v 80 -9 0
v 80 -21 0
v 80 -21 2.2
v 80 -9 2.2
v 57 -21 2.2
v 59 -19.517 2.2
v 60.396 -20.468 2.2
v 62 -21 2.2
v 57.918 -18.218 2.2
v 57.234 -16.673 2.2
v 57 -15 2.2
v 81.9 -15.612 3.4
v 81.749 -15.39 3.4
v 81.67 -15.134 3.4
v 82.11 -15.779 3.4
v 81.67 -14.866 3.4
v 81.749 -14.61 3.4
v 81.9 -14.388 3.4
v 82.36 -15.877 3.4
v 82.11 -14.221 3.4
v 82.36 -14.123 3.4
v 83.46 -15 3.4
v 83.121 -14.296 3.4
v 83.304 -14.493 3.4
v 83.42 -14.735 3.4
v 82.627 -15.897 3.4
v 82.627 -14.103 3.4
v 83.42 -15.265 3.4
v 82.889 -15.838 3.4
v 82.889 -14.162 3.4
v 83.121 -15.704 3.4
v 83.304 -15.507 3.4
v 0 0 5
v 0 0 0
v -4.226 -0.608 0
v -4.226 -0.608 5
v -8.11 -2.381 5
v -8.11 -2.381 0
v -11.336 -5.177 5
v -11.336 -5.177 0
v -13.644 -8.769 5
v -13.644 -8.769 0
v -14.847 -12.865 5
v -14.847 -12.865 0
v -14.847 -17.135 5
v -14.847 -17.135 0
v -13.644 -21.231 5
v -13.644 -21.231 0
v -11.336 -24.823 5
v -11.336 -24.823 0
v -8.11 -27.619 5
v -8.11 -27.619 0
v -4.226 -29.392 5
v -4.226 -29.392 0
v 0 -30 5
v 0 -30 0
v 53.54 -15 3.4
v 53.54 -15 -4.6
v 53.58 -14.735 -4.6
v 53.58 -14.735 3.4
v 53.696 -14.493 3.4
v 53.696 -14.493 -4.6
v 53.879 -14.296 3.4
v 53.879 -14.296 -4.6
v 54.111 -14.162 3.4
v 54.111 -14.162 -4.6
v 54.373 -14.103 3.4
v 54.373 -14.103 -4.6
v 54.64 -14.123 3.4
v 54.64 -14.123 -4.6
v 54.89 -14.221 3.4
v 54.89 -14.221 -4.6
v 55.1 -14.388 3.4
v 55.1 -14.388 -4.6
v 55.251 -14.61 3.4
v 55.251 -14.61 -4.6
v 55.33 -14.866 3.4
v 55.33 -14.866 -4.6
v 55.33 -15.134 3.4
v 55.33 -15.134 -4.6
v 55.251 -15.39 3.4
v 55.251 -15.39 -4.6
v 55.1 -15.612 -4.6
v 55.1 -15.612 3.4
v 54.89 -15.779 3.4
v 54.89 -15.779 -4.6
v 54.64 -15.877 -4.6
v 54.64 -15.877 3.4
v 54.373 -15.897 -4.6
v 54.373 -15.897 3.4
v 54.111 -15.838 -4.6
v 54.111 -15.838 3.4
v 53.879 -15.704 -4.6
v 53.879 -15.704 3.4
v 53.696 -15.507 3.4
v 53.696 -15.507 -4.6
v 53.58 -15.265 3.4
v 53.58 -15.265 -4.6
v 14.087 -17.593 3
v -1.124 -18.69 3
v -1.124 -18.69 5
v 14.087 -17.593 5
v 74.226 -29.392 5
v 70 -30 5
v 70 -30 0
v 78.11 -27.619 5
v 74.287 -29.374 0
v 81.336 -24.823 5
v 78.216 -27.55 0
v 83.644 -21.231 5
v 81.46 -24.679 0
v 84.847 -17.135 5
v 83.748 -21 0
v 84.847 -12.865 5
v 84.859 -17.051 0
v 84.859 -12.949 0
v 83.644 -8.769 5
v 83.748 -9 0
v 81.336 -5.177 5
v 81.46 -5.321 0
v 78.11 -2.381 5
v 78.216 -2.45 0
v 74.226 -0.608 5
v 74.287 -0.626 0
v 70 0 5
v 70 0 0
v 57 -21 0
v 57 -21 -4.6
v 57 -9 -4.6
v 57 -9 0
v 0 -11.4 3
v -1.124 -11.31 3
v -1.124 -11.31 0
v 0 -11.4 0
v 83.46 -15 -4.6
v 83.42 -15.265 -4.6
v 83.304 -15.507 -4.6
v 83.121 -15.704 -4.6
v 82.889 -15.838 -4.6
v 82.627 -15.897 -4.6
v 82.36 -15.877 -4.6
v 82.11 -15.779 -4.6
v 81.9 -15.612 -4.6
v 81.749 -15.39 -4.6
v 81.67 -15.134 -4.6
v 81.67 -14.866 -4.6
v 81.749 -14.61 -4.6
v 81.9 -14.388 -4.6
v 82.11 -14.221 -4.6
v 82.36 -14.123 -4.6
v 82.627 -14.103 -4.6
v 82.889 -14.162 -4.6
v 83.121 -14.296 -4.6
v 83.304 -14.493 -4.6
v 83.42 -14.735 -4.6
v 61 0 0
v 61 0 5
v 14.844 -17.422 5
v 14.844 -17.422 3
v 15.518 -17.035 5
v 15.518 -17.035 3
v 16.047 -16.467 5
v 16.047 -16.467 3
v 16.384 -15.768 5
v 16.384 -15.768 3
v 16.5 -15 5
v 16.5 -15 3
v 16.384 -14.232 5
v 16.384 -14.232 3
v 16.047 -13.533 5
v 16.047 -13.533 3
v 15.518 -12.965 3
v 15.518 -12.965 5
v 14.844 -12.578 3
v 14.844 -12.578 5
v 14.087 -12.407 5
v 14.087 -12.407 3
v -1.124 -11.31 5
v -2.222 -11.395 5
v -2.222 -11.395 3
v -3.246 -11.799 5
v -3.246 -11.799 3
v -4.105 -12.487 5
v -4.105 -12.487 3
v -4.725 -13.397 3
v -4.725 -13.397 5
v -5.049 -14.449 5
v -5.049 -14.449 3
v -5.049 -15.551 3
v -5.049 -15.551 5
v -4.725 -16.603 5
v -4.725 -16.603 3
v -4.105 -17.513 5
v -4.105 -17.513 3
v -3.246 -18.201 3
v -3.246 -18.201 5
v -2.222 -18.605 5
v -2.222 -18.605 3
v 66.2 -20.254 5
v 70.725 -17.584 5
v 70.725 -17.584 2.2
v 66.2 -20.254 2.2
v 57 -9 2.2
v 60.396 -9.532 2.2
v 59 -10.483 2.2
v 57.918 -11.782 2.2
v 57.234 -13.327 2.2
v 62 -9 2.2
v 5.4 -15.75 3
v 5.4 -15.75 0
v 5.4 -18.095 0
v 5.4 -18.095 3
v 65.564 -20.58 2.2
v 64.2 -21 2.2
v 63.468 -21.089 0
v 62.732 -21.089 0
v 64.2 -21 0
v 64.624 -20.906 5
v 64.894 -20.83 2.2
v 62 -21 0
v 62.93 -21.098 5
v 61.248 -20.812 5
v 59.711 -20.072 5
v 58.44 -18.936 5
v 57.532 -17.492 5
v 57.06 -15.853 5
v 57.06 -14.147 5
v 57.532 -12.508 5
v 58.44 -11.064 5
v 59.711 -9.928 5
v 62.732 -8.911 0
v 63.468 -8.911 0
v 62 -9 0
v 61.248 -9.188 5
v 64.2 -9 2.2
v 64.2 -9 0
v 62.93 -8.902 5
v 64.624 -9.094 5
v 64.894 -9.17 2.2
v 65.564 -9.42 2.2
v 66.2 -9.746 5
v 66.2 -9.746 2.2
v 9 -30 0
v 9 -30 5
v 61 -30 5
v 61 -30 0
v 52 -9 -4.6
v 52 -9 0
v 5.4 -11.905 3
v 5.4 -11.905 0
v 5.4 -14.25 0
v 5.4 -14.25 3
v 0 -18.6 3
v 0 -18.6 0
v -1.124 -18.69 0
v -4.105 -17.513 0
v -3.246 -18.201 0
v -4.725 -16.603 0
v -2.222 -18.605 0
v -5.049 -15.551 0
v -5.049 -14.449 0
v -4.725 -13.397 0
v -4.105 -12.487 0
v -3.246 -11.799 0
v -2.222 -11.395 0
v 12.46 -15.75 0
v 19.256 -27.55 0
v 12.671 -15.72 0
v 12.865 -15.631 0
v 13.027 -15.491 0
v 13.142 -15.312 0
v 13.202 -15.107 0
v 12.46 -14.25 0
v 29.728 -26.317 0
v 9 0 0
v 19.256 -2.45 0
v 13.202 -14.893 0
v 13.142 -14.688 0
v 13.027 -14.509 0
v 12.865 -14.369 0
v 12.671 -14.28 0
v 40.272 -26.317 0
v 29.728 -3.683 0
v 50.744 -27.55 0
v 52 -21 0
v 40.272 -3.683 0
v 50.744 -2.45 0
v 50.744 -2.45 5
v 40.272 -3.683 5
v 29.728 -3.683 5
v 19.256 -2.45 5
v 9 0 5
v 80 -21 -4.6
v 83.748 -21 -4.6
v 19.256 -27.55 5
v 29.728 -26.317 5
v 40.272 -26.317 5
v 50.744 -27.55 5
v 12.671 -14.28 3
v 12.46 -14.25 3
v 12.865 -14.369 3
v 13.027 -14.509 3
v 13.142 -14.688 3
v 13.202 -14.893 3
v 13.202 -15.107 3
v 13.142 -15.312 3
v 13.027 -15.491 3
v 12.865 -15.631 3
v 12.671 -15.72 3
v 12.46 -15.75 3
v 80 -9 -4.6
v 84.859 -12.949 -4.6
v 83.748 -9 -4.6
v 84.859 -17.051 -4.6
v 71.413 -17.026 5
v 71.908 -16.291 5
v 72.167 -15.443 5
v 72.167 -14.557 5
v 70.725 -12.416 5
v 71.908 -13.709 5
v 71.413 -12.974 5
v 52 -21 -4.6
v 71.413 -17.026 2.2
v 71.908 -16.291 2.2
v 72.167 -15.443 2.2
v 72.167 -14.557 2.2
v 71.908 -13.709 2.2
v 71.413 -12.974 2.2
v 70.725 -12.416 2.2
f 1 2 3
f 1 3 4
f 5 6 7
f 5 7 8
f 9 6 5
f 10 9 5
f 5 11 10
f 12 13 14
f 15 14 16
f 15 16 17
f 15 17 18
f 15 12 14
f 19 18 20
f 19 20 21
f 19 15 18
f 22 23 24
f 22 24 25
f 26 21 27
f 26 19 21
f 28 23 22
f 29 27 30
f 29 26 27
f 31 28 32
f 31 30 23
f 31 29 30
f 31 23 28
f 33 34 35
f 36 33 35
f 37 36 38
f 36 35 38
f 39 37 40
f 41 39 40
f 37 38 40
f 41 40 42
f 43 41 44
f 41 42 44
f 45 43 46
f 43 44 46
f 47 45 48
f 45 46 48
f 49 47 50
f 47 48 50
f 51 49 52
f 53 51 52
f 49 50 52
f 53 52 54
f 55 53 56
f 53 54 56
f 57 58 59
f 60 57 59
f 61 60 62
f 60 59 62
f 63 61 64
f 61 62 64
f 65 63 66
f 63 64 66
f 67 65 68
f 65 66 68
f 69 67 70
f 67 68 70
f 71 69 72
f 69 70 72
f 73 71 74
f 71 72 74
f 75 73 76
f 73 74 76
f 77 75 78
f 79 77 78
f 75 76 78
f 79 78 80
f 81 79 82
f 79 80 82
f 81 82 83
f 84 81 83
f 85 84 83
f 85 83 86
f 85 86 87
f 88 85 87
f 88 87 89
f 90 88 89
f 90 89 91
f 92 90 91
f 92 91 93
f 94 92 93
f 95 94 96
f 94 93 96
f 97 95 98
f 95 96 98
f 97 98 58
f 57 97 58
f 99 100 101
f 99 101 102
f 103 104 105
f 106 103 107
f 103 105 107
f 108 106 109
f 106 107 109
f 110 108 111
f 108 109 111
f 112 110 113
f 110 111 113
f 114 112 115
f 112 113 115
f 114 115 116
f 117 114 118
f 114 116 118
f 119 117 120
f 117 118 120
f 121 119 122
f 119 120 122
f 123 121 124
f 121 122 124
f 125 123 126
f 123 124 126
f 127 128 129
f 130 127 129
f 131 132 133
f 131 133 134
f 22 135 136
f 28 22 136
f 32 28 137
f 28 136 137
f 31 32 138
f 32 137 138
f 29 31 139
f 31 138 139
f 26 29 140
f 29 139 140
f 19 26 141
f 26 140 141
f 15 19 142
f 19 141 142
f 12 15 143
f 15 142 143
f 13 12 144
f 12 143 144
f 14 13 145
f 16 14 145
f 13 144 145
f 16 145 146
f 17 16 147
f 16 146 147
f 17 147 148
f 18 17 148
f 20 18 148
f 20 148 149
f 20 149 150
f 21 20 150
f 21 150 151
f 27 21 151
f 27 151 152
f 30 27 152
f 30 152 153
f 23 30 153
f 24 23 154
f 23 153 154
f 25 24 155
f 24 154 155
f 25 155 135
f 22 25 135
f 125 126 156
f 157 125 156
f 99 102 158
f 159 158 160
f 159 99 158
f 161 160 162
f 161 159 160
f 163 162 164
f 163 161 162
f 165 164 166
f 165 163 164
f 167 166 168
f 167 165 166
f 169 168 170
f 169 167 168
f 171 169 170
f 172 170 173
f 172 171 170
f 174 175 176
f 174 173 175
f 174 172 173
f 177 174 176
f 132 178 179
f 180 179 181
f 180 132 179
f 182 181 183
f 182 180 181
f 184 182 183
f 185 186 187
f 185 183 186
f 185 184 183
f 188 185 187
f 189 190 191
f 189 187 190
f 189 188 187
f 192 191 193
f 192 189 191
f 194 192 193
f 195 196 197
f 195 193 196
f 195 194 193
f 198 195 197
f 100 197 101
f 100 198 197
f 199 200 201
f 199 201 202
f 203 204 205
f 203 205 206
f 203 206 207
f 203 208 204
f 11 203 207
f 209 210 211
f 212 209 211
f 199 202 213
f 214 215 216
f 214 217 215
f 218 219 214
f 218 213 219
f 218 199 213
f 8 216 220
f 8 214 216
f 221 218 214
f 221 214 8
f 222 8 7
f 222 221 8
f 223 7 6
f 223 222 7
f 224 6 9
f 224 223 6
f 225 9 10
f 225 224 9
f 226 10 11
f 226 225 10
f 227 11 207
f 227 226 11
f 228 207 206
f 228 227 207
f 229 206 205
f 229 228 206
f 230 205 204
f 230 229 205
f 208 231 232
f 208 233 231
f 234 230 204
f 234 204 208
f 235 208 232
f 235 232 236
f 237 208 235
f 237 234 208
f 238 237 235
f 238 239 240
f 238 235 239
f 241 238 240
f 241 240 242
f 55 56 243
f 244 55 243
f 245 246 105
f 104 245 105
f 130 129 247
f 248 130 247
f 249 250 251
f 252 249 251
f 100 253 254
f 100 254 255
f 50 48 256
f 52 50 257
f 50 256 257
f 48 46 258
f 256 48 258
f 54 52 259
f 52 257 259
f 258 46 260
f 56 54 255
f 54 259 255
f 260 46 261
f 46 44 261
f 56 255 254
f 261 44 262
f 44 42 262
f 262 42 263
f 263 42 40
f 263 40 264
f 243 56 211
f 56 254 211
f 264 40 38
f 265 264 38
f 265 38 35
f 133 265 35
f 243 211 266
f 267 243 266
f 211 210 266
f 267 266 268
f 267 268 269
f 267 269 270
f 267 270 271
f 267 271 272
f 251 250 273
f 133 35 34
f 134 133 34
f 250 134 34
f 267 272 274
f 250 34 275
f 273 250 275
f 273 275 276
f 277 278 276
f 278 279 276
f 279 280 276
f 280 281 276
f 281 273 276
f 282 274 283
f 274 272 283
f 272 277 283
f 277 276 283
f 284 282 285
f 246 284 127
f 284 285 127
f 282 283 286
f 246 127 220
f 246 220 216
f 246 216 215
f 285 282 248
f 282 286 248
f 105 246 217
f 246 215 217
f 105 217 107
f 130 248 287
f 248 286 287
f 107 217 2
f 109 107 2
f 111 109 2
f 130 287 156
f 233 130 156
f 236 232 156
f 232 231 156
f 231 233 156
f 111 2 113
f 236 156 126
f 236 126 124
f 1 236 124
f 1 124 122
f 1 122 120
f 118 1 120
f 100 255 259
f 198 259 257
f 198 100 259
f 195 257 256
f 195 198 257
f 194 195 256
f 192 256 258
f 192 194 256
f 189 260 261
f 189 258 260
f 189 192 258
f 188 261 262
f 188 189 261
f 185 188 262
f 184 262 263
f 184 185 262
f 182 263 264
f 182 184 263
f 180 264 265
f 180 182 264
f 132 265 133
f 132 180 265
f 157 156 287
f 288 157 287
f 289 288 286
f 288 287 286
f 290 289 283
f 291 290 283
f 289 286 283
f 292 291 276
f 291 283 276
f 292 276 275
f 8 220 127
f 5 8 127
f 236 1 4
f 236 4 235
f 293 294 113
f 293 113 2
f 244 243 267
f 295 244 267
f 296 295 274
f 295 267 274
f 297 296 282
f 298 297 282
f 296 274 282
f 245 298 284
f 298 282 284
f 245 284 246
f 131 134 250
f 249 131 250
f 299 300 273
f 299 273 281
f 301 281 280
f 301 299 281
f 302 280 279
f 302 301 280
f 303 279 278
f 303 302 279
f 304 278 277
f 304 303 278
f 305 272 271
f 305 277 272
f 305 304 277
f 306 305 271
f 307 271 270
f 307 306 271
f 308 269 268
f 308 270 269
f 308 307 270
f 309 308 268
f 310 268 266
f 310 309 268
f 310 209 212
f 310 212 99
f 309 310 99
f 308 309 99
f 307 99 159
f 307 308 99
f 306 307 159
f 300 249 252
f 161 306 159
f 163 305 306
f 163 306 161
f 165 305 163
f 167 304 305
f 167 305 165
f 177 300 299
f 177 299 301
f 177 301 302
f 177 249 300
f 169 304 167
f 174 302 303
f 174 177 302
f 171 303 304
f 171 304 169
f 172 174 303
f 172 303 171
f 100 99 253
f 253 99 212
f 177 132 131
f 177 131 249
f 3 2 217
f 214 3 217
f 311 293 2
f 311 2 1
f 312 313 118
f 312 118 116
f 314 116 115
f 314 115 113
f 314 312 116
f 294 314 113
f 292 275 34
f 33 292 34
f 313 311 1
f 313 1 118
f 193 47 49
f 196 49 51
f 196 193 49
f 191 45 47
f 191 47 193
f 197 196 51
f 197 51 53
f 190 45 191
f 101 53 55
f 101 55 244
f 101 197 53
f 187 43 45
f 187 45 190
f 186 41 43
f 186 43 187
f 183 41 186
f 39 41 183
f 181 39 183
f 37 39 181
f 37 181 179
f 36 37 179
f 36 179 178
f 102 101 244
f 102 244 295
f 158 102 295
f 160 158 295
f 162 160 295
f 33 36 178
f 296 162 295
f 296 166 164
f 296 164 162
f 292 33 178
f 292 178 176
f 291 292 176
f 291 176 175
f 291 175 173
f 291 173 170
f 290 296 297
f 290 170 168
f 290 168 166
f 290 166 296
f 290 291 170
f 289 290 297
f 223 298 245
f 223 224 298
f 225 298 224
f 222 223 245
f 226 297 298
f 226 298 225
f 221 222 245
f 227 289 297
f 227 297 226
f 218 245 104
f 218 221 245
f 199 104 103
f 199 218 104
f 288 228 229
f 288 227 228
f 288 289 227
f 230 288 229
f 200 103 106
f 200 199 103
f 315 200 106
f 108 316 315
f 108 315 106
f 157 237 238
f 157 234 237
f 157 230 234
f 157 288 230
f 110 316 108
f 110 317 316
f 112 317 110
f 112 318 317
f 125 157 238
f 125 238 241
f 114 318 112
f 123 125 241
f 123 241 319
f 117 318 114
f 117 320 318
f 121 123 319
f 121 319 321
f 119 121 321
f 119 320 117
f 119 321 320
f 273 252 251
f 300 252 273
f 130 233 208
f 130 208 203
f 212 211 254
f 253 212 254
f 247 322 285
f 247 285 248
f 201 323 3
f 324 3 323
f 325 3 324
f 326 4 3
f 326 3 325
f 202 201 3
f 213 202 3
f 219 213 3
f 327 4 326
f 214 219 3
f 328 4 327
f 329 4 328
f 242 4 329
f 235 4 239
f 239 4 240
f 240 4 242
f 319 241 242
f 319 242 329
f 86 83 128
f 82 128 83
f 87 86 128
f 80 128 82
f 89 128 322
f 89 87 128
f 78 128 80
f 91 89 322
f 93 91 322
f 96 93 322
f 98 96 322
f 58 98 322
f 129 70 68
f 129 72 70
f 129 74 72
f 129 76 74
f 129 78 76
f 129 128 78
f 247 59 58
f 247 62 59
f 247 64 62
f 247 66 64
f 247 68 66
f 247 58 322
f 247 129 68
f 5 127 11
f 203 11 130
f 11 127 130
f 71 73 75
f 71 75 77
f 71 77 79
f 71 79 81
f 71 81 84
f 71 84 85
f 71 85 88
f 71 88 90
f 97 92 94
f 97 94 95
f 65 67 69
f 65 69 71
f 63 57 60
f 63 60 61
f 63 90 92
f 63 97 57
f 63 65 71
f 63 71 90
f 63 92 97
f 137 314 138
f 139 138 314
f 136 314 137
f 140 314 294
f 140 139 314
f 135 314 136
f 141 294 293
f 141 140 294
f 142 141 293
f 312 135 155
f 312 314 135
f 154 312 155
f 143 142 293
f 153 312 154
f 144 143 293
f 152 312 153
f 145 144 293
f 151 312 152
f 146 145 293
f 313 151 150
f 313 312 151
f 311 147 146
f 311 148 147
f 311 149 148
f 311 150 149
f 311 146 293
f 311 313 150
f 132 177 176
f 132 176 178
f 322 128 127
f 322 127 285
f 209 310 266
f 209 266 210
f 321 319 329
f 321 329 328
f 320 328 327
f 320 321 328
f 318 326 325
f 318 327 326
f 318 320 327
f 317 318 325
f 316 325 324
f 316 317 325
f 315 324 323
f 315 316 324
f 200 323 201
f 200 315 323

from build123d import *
from build123d.topology import SkipClean

# Parameters (mm, degrees)
BOSS_EXTRUDE1_DEPTH        = 5
CROQUIS3_W                 = 23
CROQUIS3_H                 = 12
CORTAR_EXTRUIR2_DEPTH      = 2.2
CORTAR_EXTRUIR3_DEPTH      = 91.182259896
CORTAR_EXTRUIR3_DEPTH_BACK = 91.182259896
CUT_EXTRUDE4_DEPTH         = 91.277350426
CUT_EXTRUDE4_DEPTH_BACK    = 2
CUT_EXTRUDE6_DEPTH         = 91.188691087
BOSS_EXTRUDE2_START        = 4.6
SKETCH9_W                  = 5
SKETCH9_H                  = 12
BOSS_EXTRUDE2_DEPTH        = 4.6
SKETCH10_R                 = 0.9
CUT_EXTRUDE7_DEPTH         = 8
CUT_EXTRUDE8_DEPTH         = 91.458609319


with BuildPart() as part:
    # Sketch1 → Boss-Extrude1 (new body)
    with BuildSketch(Plane(origin=(0, 0, 0), x_dir=(-1, 0, 0), z_dir=(0, 0, -1))):
        with BuildLine():
            Line((-70, 0), (-61, 0))
            ThreePointArc((-61, 0), (-35, -3.837363086), (-9, 0))
            Line((-9, 0), (0, 0))
            ThreePointArc((0, 0), (15, -15), (0, -30))
            Line((0, -30), (-9, -30))
            ThreePointArc((-9, -30), (-35, -26.162636914), (-61, -30))
            Line((-61, -30), (-70, -30))
            ThreePointArc((-70, -30), (-85, -15), (-70, 0))
        make_face()
        with BuildLine():
            Line((0, -11.4), (-5.4, -11.905))
            Line((-5.4, -11.905), (-5.4, -18.095))
            Line((-5.4, -18.095), (0, -18.6))
            ThreePointArc((0, -18.6), (3.6, -15), (0, -11.4))
        make_face(mode=Mode.SUBTRACT)
    extrude(amount=-BOSS_EXTRUDE1_DEPTH)

    # Croquis3 → Cortar-Extruir2 (cut)
    with BuildSketch(Plane(origin=(0, 0, 0), x_dir=(-1, 0, 0), z_dir=(0, 0, -1))):
        with Locations((-68.5, -15)):
            Rectangle(CROQUIS3_W, CROQUIS3_H)
    extrude(amount=-CORTAR_EXTRUIR2_DEPTH, mode=Mode.SUBTRACT)

    # Croquis4 → Cortar-Extruir3 (cut, two sides: drawn at the far end of the back side and taken through both)
    with BuildSketch(Plane(origin=(0, 0, 2.2), x_dir=(-1, 0, 0), z_dir=(0, 0, -1)).offset(-CORTAR_EXTRUIR3_DEPTH_BACK)):
        with BuildLine():
            Line((-66.2, -9.746429785), (-70.724590164, -12.416276944))
            ThreePointArc((-70.724590164, -12.416276944), (-72.2, -15), (-70.724590164, -17.583723056))
            Line((-70.724590164, -17.583723056), (-66.2, -20.253570215))
            ThreePointArc((-66.2, -20.253570215), (-57, -15), (-66.2, -9.746429785))
        make_face()
    extrude(amount=CORTAR_EXTRUIR3_DEPTH + CORTAR_EXTRUIR3_DEPTH_BACK, mode=Mode.SUBTRACT)

    # Sketch6 → Cut-Extrude4 (cut, two sides: drawn at the far end of the back side and taken through both)
    with BuildSketch(Plane.XY.offset(5).offset(-CUT_EXTRUDE4_DEPTH_BACK)):
        with BuildLine():
            Line((14.08705036, -12.406737159), (-1.12381295, -11.309587495))
            ThreePointArc((-1.12381295, -11.309587495), (-5.09, -15), (-1.12381295, -18.690412505))
            Line((-1.12381295, -18.690412505), (14.08705036, -17.593262841))
            ThreePointArc((14.08705036, -17.593262841), (16.5, -15), (14.08705036, -12.406737159))
        make_face()
    extrude(amount=CUT_EXTRUDE4_DEPTH + CUT_EXTRUDE4_DEPTH_BACK, mode=Mode.SUBTRACT)

    # Sketch8 → Cut-Extrude6 (cut, through all)
    with SkipClean():  # the faces are left unmerged after this step: merging them gives an invalid solid
        with BuildSketch(Plane.XY.offset(3)):
            with BuildLine():
                Line((-1.12381295, -11.309587495), (0, -11.4))
                ThreePointArc((0, -11.4), (-3.6, -15), (0, -18.6))
                Line((0, -18.6), (-1.12381295, -18.690412505))
                ThreePointArc((-1.12381295, -18.690412505), (-5.09, -15), (-1.12381295, -11.309587495))
            make_face()
        extrude(amount=-CUT_EXTRUDE6_DEPTH, mode=Mode.SUBTRACT)

    # Sketch9 → Boss-Extrude2 (add)
    with SkipClean():  # the faces are left unmerged after this step: merging them gives an invalid solid
        with BuildSketch(Plane(origin=(0, 0, 0), x_dir=(-1, 0, 0), z_dir=(0, 0, -1)).offset(BOSS_EXTRUDE2_START)):
            with BuildLine():
                Line((-83.747727085, -21), (-80, -21))
                Line((-80, -21), (-80, -9))
                Line((-80, -9), (-83.747727085, -9))
                ThreePointArc((-83.747727085, -9), (-85, -15), (-83.747727085, -21))
            make_face()
            with Locations((-54.5, -15)):
                Rectangle(SKETCH9_W, SKETCH9_H)
        extrude(amount=-BOSS_EXTRUDE2_DEPTH)

    # Sketch10 → Cut-Extrude7 (cut)
    with SkipClean():  # the faces are left unmerged after this step: merging them gives an invalid solid
        with BuildSketch(Plane(origin=(0, 0, -4.6), x_dir=(-1, 0, 0), z_dir=(0, 0, -1))):
            with Locations((-54.44, -15)):
                Circle(SKETCH10_R)
            with Locations(Location((-82.56, -15, 0), (0, 0, 180))):
                Circle(SKETCH10_R)
        extrude(amount=-CUT_EXTRUDE7_DEPTH, mode=Mode.SUBTRACT)

    # Sketch11 → Cut-Extrude8 (cut, through all)
    with SkipClean():  # the faces are left unmerged after this step: merging them gives an invalid solid
        with BuildSketch(Plane.XY.offset(3)):
            with BuildLine():
                Line((4.96, -14.25), (12.46, -14.25))
                ThreePointArc((12.46, -14.25), (13.21, -15), (12.46, -15.75))
                Line((12.46, -15.75), (4.96, -15.75))
                Line((4.96, -15.75), (4.96, -14.25))
            make_face()
        extrude(amount=-CUT_EXTRUDE8_DEPTH, mode=Mode.SUBTRACT)


solid = part.part
